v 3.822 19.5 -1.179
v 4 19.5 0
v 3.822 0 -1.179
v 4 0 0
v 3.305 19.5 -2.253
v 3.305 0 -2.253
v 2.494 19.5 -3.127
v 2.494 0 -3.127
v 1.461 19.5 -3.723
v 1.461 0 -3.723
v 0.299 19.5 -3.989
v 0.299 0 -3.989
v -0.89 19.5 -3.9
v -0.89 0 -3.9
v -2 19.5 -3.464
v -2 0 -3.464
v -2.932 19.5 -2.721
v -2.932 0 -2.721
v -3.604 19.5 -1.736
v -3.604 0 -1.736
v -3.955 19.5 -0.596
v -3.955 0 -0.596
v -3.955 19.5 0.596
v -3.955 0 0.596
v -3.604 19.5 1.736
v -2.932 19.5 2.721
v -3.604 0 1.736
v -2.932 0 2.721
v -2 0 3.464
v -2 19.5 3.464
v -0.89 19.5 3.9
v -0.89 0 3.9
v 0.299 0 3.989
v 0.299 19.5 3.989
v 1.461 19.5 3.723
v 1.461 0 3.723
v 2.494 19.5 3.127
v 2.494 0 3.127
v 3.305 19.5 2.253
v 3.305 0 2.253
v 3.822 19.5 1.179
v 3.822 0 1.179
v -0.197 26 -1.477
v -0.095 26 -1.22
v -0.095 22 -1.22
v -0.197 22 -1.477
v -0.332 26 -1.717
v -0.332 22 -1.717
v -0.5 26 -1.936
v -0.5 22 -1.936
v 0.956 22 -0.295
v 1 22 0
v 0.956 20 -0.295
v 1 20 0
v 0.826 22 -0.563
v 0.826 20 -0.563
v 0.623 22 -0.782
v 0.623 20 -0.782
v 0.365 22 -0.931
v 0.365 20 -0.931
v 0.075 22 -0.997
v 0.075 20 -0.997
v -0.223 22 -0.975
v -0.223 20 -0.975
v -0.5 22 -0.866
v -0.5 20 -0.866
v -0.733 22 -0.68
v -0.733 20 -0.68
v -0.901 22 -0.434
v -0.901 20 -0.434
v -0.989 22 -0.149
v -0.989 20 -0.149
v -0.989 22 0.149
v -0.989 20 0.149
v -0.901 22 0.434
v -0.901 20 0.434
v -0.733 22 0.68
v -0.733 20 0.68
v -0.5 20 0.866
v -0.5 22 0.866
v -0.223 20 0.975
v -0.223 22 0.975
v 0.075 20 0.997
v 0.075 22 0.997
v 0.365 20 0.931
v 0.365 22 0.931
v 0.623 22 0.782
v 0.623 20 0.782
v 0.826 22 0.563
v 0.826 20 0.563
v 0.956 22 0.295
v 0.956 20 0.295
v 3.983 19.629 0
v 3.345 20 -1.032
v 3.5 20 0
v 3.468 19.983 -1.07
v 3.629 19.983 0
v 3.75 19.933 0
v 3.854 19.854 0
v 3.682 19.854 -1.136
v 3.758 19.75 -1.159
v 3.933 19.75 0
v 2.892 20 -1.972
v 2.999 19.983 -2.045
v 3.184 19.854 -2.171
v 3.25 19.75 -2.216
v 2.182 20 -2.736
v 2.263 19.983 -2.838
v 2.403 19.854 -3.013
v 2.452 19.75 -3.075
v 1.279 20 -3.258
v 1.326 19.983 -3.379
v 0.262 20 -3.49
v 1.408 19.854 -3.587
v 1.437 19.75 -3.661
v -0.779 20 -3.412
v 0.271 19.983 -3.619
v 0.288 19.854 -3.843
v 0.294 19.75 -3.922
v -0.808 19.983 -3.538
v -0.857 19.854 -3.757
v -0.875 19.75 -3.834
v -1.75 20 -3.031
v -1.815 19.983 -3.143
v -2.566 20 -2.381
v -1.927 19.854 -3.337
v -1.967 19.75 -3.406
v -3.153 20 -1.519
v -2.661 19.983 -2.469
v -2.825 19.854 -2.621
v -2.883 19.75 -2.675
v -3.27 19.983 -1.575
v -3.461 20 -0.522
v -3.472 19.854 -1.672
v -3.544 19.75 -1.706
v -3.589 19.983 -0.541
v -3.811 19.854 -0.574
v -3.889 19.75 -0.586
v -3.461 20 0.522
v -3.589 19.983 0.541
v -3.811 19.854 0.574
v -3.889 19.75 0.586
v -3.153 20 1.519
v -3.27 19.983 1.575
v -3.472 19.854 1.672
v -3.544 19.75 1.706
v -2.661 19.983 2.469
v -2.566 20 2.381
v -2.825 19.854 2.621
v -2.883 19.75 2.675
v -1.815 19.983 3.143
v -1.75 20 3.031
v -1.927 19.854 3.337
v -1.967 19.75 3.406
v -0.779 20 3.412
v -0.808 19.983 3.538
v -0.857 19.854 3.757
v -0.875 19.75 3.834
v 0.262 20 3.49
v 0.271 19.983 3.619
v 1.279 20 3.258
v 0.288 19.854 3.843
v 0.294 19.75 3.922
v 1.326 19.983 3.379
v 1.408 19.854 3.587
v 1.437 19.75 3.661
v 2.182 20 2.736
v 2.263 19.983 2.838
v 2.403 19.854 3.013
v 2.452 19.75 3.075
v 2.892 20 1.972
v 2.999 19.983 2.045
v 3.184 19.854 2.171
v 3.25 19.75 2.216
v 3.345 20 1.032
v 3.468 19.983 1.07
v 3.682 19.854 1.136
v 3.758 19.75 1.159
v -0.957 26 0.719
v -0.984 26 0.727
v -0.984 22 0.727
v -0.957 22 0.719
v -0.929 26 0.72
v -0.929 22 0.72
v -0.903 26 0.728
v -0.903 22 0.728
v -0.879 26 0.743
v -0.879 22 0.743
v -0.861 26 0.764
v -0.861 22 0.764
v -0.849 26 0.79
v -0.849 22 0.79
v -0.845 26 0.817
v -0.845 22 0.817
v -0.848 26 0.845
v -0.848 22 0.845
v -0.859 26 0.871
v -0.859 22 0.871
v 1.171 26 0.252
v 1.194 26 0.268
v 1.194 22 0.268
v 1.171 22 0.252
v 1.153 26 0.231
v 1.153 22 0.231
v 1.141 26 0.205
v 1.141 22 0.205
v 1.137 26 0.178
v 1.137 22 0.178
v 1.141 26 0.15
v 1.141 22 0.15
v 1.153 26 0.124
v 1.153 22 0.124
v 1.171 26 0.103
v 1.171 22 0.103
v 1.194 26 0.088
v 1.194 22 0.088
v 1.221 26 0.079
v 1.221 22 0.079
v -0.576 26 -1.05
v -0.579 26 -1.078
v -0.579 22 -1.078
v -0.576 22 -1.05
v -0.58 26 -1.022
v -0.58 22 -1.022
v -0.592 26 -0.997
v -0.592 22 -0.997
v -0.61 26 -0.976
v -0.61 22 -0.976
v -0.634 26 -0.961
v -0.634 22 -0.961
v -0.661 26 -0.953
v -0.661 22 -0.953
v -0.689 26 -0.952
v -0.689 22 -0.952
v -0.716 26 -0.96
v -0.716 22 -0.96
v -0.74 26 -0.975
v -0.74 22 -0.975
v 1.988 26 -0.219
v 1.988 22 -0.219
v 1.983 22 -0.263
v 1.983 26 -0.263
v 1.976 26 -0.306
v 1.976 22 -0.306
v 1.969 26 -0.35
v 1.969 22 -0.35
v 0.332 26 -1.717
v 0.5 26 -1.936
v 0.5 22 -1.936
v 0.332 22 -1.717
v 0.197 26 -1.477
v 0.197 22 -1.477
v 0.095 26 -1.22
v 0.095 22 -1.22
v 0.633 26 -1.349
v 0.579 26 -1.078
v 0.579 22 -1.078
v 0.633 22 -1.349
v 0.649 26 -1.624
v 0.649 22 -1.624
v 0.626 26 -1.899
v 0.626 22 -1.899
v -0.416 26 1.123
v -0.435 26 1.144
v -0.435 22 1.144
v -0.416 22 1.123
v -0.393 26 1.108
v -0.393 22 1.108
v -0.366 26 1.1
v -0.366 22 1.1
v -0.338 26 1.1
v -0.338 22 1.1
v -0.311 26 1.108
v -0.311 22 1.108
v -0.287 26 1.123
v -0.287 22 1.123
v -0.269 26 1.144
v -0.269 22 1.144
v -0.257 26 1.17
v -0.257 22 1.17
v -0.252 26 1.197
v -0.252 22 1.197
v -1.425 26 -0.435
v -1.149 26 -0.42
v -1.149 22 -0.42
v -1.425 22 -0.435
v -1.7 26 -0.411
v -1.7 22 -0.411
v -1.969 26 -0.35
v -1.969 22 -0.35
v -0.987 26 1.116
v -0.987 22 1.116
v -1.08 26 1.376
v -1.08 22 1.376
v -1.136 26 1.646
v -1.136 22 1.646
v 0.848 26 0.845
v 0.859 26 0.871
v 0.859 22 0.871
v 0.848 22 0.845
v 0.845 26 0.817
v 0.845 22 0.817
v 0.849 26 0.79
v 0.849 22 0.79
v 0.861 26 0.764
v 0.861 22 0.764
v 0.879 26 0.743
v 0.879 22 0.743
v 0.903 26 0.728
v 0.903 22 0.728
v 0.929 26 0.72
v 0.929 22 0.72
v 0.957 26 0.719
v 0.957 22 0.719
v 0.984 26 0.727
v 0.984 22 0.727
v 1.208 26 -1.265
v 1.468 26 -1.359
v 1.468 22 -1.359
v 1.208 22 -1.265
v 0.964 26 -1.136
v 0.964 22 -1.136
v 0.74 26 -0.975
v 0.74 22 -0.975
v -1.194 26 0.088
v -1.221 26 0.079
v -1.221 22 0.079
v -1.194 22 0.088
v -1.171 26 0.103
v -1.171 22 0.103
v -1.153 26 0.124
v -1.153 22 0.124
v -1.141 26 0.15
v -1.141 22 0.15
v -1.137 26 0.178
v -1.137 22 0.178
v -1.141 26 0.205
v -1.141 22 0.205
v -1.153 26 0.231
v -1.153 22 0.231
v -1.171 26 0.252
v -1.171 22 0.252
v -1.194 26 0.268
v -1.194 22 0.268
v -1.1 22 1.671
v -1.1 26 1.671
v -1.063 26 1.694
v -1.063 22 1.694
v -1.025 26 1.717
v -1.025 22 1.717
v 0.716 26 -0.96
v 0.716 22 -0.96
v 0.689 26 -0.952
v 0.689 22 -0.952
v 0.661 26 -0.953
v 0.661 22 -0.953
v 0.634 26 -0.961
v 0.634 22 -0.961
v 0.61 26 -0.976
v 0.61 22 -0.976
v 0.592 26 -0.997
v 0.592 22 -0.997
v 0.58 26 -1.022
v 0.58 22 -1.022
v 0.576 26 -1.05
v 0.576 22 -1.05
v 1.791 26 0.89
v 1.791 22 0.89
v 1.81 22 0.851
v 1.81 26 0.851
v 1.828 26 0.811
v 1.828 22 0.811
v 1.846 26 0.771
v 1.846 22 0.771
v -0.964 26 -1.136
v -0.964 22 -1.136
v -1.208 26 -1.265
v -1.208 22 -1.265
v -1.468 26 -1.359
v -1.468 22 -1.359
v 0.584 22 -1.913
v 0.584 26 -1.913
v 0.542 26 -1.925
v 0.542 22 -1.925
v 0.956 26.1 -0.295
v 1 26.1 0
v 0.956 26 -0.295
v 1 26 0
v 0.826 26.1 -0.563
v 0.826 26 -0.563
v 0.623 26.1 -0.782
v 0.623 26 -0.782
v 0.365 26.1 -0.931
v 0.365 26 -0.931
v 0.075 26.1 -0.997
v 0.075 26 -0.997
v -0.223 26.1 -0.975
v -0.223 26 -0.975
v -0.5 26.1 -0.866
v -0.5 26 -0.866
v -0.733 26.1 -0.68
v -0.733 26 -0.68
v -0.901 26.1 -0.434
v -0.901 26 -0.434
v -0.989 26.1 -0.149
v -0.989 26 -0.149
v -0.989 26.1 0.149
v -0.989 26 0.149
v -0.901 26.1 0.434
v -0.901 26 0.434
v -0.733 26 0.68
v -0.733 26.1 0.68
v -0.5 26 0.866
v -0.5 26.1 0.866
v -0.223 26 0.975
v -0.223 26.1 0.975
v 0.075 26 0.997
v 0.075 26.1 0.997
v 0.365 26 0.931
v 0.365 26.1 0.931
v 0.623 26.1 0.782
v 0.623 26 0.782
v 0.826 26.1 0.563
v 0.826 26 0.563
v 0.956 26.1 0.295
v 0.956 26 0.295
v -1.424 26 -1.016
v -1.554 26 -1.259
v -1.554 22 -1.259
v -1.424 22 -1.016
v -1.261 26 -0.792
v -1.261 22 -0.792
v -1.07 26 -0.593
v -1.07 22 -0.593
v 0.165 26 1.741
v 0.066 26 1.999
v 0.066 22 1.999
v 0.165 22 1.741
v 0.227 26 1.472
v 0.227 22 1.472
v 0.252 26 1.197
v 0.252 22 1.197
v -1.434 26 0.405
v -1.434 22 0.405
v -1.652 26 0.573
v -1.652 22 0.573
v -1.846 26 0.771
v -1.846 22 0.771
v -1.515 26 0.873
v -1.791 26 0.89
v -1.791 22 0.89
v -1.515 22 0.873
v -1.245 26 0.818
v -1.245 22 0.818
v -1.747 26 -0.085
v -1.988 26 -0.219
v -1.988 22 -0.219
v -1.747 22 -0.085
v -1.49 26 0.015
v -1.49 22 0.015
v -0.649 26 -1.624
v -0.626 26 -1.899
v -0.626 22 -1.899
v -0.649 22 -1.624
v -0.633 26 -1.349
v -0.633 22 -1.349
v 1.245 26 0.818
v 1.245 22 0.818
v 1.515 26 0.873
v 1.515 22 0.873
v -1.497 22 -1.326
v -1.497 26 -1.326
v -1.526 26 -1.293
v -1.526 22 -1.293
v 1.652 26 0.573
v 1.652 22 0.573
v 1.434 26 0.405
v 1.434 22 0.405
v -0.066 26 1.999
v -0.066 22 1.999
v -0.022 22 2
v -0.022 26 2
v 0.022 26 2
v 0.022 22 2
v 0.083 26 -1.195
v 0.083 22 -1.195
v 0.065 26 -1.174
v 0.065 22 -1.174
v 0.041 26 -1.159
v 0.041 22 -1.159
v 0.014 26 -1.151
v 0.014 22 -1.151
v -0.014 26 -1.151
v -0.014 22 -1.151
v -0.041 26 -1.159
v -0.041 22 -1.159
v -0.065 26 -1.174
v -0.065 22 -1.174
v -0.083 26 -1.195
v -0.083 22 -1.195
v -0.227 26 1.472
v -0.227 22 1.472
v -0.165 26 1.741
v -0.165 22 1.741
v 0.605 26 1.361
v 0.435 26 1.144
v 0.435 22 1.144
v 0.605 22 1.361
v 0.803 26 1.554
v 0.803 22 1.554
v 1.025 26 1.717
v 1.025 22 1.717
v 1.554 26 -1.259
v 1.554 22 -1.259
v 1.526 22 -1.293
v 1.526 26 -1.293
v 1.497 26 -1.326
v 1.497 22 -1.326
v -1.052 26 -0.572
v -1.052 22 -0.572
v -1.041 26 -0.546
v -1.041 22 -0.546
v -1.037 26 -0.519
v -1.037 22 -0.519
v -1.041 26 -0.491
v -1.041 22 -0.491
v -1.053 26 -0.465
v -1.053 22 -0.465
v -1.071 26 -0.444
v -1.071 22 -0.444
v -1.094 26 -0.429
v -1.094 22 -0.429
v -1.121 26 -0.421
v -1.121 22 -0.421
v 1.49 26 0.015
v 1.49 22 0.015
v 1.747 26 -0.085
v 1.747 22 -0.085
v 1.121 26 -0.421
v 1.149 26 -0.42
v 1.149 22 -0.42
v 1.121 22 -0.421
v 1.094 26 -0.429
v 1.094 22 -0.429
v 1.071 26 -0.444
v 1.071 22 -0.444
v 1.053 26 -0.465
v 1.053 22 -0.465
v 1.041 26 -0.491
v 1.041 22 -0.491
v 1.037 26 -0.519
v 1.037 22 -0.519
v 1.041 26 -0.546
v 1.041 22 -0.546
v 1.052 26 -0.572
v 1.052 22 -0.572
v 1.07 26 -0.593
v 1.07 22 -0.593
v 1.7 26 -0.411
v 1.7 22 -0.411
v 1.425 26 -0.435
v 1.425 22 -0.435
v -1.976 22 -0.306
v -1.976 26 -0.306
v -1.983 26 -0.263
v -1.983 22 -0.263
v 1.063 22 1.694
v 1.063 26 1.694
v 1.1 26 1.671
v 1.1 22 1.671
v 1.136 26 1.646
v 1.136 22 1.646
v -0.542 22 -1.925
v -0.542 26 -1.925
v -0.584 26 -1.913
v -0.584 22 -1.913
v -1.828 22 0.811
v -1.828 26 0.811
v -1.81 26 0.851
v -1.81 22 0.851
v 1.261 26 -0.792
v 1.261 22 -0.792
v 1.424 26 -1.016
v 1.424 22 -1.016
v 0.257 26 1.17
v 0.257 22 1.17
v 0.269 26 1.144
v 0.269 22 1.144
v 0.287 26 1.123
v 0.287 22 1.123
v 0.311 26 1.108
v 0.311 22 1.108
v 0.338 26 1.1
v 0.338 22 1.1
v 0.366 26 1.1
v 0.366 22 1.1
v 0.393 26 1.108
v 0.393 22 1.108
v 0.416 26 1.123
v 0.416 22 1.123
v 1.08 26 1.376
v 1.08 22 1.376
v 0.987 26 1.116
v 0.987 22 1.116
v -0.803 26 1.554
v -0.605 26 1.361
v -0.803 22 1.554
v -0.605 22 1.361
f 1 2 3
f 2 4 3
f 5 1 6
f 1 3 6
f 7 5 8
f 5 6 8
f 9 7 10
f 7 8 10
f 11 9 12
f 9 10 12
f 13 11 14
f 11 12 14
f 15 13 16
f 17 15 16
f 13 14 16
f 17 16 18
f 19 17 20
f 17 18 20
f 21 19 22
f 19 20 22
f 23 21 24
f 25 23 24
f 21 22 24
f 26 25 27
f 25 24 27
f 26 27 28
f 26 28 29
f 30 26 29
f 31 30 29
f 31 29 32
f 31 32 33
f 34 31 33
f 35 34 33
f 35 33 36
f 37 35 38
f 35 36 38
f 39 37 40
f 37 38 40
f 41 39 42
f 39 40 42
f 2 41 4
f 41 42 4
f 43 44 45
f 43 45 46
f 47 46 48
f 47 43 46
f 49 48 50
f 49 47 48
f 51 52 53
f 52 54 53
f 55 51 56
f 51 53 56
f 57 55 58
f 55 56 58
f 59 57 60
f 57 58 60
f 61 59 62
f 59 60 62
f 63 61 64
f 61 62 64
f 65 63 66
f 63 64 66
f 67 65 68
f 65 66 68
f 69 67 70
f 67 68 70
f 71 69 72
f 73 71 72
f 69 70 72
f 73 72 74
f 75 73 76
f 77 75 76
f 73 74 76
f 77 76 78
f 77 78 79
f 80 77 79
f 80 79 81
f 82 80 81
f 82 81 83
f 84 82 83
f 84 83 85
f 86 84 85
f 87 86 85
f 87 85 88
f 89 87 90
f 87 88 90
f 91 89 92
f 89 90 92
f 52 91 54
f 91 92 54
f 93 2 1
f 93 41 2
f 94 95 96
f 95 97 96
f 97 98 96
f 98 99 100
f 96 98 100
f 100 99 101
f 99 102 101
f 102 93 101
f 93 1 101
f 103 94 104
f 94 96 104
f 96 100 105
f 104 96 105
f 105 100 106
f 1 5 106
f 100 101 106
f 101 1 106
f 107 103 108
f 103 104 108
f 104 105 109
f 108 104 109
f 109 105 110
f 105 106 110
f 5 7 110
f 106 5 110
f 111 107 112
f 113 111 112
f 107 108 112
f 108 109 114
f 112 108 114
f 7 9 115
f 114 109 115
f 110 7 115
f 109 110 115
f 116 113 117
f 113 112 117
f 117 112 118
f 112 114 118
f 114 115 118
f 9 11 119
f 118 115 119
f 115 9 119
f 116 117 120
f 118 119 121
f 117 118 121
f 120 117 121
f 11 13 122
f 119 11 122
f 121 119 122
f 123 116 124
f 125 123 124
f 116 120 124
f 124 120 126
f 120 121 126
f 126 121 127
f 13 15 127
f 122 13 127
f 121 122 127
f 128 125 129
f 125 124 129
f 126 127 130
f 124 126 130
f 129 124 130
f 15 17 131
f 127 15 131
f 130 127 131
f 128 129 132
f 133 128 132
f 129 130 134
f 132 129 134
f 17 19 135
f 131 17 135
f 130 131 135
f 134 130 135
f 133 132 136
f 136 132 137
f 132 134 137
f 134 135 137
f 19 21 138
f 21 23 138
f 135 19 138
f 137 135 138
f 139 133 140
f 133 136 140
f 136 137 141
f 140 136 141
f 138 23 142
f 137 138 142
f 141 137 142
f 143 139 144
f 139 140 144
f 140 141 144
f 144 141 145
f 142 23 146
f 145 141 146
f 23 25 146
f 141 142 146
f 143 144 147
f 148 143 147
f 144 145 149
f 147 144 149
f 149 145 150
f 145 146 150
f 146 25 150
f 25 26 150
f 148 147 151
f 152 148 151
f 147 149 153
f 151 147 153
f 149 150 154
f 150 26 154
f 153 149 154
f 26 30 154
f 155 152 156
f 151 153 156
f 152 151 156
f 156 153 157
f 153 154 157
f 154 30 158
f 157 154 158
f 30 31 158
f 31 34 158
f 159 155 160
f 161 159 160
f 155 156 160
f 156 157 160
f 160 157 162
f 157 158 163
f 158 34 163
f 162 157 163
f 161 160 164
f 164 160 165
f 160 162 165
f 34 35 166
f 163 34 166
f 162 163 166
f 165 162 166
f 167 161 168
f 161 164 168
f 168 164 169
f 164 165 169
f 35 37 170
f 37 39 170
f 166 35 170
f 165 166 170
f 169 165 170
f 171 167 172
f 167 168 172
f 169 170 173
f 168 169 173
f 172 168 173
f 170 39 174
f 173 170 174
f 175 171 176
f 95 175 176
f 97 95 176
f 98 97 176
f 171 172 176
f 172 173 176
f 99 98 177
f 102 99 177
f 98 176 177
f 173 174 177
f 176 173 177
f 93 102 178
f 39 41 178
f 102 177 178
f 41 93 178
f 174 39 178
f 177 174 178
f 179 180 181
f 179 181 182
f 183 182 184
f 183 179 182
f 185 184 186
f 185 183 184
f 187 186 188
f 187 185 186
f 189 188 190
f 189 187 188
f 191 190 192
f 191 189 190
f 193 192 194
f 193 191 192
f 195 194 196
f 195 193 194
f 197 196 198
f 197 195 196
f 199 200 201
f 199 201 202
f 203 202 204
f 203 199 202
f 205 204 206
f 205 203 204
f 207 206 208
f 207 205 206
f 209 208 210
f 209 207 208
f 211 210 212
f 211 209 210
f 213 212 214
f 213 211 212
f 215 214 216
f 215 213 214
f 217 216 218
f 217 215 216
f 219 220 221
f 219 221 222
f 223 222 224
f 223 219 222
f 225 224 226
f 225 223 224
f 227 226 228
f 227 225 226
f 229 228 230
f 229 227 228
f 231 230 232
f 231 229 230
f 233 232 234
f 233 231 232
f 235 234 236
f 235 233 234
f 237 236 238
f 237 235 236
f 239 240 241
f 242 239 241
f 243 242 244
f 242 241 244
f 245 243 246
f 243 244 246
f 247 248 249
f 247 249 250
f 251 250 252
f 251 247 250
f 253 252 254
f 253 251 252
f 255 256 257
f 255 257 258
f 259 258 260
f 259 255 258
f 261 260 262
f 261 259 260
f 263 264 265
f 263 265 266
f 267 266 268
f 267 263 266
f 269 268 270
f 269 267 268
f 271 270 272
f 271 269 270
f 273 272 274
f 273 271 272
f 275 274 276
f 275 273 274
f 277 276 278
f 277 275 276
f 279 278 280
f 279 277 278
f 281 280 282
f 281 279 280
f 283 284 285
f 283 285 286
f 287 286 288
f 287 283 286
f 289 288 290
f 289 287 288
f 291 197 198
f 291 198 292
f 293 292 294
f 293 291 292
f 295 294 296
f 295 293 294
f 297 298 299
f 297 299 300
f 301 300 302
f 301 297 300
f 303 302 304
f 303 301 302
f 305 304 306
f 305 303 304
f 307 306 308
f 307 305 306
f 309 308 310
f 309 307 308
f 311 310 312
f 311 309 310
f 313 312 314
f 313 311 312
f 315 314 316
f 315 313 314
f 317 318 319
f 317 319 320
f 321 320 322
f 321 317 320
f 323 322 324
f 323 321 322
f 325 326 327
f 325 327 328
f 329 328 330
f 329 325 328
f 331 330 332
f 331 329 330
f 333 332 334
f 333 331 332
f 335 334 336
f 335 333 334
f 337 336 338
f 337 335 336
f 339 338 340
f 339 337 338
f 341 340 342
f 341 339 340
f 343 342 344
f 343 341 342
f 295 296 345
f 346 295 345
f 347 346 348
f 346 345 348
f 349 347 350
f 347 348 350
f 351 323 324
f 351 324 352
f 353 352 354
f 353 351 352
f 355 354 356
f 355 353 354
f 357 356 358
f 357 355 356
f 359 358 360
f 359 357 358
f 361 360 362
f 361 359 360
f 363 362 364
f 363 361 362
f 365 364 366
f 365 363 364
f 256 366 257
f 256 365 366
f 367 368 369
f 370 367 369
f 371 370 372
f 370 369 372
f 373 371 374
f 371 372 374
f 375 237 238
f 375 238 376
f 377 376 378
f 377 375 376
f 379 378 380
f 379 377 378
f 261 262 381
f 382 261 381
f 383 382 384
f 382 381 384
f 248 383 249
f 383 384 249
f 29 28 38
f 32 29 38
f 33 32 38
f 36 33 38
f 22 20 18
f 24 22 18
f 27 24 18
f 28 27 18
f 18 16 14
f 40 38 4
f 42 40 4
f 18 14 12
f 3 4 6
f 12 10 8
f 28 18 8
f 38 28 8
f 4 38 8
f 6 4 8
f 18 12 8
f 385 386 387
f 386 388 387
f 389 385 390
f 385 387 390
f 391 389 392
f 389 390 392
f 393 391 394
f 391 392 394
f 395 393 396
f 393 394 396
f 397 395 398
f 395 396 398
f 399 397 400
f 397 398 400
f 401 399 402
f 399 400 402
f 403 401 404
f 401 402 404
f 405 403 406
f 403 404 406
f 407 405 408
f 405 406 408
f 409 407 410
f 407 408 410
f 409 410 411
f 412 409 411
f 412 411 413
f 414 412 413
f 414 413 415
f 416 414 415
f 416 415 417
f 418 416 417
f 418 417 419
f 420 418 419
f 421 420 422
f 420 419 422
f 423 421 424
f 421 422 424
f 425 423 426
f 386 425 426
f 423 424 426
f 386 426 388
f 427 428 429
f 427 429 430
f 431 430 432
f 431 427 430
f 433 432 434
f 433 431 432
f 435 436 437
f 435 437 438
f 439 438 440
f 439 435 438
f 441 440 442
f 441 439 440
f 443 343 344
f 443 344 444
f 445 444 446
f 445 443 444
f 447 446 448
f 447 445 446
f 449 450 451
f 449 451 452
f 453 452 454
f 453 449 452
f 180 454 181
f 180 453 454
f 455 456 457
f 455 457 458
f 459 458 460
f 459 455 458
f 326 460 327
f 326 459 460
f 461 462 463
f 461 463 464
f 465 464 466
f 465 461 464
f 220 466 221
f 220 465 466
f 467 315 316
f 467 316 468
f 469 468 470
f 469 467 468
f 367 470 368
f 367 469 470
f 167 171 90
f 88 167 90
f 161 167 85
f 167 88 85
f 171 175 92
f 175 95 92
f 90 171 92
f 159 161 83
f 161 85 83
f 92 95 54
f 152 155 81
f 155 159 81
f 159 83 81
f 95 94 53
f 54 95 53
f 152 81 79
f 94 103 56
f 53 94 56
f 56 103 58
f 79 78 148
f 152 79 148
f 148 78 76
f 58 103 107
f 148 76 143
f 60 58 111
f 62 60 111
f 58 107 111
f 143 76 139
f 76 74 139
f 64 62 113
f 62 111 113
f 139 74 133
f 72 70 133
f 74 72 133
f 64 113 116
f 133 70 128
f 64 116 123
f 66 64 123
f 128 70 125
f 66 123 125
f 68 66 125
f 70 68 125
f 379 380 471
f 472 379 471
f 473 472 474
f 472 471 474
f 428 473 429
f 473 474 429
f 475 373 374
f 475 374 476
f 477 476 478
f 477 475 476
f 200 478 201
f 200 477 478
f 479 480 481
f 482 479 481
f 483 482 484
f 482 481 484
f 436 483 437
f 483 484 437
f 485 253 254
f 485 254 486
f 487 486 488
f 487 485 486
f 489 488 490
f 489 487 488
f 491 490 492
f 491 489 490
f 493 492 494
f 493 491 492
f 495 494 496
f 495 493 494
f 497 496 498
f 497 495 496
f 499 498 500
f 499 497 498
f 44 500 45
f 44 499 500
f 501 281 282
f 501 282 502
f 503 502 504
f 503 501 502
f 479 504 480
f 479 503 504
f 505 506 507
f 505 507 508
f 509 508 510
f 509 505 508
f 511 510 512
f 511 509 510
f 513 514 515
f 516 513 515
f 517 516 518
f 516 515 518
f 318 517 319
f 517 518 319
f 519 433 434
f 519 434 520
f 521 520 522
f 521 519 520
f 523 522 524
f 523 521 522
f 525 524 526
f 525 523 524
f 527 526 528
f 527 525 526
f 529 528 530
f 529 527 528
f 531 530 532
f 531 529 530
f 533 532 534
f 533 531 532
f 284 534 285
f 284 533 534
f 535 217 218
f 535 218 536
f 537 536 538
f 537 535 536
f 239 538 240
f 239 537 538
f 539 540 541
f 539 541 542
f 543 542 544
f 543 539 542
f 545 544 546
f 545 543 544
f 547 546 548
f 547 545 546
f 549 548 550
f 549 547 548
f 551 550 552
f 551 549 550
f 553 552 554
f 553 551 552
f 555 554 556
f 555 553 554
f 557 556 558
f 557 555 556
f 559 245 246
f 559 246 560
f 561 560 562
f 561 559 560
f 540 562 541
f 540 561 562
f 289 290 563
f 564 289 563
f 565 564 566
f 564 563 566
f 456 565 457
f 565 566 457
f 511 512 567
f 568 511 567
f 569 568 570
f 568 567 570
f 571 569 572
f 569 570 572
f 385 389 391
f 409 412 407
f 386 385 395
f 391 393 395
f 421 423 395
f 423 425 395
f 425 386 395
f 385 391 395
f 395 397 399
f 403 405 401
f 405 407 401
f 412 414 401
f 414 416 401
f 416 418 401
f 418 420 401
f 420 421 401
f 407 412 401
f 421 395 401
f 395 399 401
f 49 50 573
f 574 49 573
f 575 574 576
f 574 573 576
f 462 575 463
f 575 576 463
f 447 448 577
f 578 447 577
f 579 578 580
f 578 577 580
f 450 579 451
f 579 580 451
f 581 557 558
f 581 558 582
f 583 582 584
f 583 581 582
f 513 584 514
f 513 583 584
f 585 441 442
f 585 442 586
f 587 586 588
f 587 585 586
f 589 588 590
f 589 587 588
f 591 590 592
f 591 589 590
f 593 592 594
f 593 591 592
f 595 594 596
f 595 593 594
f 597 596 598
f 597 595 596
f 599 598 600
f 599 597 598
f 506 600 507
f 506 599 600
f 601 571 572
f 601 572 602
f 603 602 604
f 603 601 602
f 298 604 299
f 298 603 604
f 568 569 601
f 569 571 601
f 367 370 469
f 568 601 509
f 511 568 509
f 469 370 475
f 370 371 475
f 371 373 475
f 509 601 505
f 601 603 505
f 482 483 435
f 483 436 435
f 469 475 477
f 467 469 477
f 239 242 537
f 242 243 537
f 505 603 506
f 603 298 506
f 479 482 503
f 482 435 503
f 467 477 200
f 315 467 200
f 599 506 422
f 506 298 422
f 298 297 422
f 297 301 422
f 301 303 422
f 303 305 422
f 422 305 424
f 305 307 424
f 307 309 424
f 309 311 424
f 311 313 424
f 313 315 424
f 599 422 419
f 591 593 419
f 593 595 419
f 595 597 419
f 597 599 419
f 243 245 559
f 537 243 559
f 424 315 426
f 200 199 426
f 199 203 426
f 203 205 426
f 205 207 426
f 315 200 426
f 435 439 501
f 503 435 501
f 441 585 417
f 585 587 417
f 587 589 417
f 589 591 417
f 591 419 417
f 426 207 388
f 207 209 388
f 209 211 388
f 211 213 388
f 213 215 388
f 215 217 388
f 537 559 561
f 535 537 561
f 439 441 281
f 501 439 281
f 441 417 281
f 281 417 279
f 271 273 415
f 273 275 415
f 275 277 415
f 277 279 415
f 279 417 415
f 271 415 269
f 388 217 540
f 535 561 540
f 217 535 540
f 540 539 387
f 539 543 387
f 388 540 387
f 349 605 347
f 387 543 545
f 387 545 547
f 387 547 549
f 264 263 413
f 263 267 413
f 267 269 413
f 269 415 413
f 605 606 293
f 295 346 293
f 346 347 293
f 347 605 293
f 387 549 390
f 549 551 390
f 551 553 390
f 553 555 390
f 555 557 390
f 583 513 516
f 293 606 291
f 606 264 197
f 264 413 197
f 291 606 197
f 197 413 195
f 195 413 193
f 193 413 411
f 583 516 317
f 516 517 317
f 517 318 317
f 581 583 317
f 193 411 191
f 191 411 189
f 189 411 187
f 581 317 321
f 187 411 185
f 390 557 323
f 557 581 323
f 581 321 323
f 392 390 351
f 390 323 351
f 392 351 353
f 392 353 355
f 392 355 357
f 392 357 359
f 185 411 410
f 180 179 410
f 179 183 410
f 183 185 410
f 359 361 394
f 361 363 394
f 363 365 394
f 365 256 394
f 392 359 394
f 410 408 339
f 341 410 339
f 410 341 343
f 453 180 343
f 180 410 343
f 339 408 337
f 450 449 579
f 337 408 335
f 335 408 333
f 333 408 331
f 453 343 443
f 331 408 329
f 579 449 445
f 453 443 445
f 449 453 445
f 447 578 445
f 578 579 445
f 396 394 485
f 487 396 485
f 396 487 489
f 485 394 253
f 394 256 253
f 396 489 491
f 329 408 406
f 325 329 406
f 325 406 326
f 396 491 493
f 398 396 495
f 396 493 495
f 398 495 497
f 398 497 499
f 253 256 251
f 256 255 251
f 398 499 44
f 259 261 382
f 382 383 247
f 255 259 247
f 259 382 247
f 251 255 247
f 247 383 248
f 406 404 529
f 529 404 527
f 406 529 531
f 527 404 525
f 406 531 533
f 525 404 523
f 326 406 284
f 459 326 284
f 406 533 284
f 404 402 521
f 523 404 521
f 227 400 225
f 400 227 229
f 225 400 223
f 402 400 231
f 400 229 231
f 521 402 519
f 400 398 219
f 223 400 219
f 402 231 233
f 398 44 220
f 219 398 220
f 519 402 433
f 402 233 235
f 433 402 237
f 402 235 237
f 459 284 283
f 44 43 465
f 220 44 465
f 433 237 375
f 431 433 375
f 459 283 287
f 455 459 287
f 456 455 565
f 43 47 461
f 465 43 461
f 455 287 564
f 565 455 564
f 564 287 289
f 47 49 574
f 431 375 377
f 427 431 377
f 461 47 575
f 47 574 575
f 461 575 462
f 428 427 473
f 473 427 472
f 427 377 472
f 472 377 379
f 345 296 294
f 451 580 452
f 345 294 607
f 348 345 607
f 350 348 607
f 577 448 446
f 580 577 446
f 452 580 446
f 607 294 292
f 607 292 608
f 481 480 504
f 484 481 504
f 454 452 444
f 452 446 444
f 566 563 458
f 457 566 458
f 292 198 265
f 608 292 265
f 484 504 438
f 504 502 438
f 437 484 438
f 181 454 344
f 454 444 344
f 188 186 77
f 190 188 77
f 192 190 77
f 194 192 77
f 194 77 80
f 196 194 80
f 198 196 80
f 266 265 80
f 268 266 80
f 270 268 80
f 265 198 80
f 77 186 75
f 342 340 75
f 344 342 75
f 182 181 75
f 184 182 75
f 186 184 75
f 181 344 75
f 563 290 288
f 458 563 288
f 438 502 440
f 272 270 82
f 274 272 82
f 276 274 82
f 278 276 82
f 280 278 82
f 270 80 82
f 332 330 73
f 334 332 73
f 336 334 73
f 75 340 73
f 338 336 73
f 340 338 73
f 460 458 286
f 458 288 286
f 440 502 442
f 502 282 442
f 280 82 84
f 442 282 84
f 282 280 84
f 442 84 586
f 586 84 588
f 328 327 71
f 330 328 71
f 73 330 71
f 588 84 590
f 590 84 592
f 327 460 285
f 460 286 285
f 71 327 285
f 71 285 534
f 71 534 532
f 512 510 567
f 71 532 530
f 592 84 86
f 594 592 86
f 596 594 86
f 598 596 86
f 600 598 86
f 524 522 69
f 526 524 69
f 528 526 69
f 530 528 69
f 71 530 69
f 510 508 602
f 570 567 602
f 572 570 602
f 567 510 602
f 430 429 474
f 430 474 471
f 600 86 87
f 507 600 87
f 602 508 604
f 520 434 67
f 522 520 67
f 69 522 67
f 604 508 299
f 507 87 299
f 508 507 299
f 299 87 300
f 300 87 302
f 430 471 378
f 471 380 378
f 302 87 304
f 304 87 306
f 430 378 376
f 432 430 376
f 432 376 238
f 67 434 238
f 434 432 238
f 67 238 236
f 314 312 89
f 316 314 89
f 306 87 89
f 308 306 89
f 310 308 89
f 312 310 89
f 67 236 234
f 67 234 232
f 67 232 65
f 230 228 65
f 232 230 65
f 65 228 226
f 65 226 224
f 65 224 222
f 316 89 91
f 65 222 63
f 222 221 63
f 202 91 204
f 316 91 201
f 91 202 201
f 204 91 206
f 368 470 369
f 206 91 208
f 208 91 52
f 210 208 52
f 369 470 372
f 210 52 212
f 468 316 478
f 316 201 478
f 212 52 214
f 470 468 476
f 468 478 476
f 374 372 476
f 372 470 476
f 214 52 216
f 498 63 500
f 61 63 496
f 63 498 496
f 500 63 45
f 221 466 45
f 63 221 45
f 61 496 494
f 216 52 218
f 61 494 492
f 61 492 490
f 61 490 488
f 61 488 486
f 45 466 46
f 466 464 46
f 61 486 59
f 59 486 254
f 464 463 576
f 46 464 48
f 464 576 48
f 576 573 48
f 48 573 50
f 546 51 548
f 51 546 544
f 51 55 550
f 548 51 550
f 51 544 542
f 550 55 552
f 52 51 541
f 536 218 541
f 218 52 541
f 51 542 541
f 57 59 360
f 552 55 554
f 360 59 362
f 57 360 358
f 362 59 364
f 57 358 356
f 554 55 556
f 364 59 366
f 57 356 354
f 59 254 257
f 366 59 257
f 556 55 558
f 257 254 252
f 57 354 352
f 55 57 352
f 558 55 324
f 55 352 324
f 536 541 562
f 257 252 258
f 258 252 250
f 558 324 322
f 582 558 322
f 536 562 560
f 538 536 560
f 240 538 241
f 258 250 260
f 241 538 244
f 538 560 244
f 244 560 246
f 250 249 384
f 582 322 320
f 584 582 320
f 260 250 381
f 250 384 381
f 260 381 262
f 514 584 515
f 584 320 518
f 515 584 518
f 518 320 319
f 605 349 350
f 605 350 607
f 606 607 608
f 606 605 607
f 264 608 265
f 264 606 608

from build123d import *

# Parameters (mm, degrees)
CUT_EXTRUDE1_DEPTH = 4
CIRPATTERN1_COUNT  = 11


with BuildPart() as part:
    # Sketch1 → Revolve1 (revolve)
    with BuildSketch(Plane.XY):
        with BuildLine():
            Line((0, 0), (0, 26.1))
            Line((0, 26.1), (1, 26.1))
            Line((1, 26.1), (1, 26))
            Line((1, 26), (2, 26))
            Line((2, 26), (2, 22))
            Line((2, 22), (1, 22))
            Line((1, 22), (1, 20))
            Line((1, 20), (3.5, 20))
            ThreePointArc((3.5, 20), (3.853553391, 19.853553391), (4, 19.5))
            Line((4, 19.5), (4, 0))
            Line((4, 0), (0, 0))
        make_face()
    revolve(axis=Axis((0, 0, 0), (0, 1, 0)))

    # Sketch2 → Cut-Extrude1 (cut)
    with BuildSketch(Plane(origin=(0, 26, 0), x_dir=(1, 0, 0), z_dir=(0, 1, 0))):
        with BuildLine():
            ThreePointArc((-0.5, 1.936491673), (0, 2), (0.5, 1.936491673))
            ThreePointArc((0.5, 1.936491673), (0.260400333, 1.599188187), (0.095331419, 1.219801979))
            ThreePointArc((0.095331419, 1.219801979), (0, 1.15), (-0.095331419, 1.219801979))
            ThreePointArc((-0.095331419, 1.219801979), (-0.260400333, 1.599188187), (-0.5, 1.936491673))
        make_face()
    cut_extrude1 = extrude(amount=-CUT_EXTRUDE1_DEPTH, mode=Mode.SUBTRACT)

    # CirPattern1: Cut-Extrude1 ×11 about axis
    cirpattern1_axis = Axis((0, 0, 0), (0, 1, 0))
    for i in range(1, CIRPATTERN1_COUNT):
        add(cut_extrude1.rotate(cirpattern1_axis, i * 360 / CIRPATTERN1_COUNT), mode=Mode.SUBTRACT)


solid = part.part
